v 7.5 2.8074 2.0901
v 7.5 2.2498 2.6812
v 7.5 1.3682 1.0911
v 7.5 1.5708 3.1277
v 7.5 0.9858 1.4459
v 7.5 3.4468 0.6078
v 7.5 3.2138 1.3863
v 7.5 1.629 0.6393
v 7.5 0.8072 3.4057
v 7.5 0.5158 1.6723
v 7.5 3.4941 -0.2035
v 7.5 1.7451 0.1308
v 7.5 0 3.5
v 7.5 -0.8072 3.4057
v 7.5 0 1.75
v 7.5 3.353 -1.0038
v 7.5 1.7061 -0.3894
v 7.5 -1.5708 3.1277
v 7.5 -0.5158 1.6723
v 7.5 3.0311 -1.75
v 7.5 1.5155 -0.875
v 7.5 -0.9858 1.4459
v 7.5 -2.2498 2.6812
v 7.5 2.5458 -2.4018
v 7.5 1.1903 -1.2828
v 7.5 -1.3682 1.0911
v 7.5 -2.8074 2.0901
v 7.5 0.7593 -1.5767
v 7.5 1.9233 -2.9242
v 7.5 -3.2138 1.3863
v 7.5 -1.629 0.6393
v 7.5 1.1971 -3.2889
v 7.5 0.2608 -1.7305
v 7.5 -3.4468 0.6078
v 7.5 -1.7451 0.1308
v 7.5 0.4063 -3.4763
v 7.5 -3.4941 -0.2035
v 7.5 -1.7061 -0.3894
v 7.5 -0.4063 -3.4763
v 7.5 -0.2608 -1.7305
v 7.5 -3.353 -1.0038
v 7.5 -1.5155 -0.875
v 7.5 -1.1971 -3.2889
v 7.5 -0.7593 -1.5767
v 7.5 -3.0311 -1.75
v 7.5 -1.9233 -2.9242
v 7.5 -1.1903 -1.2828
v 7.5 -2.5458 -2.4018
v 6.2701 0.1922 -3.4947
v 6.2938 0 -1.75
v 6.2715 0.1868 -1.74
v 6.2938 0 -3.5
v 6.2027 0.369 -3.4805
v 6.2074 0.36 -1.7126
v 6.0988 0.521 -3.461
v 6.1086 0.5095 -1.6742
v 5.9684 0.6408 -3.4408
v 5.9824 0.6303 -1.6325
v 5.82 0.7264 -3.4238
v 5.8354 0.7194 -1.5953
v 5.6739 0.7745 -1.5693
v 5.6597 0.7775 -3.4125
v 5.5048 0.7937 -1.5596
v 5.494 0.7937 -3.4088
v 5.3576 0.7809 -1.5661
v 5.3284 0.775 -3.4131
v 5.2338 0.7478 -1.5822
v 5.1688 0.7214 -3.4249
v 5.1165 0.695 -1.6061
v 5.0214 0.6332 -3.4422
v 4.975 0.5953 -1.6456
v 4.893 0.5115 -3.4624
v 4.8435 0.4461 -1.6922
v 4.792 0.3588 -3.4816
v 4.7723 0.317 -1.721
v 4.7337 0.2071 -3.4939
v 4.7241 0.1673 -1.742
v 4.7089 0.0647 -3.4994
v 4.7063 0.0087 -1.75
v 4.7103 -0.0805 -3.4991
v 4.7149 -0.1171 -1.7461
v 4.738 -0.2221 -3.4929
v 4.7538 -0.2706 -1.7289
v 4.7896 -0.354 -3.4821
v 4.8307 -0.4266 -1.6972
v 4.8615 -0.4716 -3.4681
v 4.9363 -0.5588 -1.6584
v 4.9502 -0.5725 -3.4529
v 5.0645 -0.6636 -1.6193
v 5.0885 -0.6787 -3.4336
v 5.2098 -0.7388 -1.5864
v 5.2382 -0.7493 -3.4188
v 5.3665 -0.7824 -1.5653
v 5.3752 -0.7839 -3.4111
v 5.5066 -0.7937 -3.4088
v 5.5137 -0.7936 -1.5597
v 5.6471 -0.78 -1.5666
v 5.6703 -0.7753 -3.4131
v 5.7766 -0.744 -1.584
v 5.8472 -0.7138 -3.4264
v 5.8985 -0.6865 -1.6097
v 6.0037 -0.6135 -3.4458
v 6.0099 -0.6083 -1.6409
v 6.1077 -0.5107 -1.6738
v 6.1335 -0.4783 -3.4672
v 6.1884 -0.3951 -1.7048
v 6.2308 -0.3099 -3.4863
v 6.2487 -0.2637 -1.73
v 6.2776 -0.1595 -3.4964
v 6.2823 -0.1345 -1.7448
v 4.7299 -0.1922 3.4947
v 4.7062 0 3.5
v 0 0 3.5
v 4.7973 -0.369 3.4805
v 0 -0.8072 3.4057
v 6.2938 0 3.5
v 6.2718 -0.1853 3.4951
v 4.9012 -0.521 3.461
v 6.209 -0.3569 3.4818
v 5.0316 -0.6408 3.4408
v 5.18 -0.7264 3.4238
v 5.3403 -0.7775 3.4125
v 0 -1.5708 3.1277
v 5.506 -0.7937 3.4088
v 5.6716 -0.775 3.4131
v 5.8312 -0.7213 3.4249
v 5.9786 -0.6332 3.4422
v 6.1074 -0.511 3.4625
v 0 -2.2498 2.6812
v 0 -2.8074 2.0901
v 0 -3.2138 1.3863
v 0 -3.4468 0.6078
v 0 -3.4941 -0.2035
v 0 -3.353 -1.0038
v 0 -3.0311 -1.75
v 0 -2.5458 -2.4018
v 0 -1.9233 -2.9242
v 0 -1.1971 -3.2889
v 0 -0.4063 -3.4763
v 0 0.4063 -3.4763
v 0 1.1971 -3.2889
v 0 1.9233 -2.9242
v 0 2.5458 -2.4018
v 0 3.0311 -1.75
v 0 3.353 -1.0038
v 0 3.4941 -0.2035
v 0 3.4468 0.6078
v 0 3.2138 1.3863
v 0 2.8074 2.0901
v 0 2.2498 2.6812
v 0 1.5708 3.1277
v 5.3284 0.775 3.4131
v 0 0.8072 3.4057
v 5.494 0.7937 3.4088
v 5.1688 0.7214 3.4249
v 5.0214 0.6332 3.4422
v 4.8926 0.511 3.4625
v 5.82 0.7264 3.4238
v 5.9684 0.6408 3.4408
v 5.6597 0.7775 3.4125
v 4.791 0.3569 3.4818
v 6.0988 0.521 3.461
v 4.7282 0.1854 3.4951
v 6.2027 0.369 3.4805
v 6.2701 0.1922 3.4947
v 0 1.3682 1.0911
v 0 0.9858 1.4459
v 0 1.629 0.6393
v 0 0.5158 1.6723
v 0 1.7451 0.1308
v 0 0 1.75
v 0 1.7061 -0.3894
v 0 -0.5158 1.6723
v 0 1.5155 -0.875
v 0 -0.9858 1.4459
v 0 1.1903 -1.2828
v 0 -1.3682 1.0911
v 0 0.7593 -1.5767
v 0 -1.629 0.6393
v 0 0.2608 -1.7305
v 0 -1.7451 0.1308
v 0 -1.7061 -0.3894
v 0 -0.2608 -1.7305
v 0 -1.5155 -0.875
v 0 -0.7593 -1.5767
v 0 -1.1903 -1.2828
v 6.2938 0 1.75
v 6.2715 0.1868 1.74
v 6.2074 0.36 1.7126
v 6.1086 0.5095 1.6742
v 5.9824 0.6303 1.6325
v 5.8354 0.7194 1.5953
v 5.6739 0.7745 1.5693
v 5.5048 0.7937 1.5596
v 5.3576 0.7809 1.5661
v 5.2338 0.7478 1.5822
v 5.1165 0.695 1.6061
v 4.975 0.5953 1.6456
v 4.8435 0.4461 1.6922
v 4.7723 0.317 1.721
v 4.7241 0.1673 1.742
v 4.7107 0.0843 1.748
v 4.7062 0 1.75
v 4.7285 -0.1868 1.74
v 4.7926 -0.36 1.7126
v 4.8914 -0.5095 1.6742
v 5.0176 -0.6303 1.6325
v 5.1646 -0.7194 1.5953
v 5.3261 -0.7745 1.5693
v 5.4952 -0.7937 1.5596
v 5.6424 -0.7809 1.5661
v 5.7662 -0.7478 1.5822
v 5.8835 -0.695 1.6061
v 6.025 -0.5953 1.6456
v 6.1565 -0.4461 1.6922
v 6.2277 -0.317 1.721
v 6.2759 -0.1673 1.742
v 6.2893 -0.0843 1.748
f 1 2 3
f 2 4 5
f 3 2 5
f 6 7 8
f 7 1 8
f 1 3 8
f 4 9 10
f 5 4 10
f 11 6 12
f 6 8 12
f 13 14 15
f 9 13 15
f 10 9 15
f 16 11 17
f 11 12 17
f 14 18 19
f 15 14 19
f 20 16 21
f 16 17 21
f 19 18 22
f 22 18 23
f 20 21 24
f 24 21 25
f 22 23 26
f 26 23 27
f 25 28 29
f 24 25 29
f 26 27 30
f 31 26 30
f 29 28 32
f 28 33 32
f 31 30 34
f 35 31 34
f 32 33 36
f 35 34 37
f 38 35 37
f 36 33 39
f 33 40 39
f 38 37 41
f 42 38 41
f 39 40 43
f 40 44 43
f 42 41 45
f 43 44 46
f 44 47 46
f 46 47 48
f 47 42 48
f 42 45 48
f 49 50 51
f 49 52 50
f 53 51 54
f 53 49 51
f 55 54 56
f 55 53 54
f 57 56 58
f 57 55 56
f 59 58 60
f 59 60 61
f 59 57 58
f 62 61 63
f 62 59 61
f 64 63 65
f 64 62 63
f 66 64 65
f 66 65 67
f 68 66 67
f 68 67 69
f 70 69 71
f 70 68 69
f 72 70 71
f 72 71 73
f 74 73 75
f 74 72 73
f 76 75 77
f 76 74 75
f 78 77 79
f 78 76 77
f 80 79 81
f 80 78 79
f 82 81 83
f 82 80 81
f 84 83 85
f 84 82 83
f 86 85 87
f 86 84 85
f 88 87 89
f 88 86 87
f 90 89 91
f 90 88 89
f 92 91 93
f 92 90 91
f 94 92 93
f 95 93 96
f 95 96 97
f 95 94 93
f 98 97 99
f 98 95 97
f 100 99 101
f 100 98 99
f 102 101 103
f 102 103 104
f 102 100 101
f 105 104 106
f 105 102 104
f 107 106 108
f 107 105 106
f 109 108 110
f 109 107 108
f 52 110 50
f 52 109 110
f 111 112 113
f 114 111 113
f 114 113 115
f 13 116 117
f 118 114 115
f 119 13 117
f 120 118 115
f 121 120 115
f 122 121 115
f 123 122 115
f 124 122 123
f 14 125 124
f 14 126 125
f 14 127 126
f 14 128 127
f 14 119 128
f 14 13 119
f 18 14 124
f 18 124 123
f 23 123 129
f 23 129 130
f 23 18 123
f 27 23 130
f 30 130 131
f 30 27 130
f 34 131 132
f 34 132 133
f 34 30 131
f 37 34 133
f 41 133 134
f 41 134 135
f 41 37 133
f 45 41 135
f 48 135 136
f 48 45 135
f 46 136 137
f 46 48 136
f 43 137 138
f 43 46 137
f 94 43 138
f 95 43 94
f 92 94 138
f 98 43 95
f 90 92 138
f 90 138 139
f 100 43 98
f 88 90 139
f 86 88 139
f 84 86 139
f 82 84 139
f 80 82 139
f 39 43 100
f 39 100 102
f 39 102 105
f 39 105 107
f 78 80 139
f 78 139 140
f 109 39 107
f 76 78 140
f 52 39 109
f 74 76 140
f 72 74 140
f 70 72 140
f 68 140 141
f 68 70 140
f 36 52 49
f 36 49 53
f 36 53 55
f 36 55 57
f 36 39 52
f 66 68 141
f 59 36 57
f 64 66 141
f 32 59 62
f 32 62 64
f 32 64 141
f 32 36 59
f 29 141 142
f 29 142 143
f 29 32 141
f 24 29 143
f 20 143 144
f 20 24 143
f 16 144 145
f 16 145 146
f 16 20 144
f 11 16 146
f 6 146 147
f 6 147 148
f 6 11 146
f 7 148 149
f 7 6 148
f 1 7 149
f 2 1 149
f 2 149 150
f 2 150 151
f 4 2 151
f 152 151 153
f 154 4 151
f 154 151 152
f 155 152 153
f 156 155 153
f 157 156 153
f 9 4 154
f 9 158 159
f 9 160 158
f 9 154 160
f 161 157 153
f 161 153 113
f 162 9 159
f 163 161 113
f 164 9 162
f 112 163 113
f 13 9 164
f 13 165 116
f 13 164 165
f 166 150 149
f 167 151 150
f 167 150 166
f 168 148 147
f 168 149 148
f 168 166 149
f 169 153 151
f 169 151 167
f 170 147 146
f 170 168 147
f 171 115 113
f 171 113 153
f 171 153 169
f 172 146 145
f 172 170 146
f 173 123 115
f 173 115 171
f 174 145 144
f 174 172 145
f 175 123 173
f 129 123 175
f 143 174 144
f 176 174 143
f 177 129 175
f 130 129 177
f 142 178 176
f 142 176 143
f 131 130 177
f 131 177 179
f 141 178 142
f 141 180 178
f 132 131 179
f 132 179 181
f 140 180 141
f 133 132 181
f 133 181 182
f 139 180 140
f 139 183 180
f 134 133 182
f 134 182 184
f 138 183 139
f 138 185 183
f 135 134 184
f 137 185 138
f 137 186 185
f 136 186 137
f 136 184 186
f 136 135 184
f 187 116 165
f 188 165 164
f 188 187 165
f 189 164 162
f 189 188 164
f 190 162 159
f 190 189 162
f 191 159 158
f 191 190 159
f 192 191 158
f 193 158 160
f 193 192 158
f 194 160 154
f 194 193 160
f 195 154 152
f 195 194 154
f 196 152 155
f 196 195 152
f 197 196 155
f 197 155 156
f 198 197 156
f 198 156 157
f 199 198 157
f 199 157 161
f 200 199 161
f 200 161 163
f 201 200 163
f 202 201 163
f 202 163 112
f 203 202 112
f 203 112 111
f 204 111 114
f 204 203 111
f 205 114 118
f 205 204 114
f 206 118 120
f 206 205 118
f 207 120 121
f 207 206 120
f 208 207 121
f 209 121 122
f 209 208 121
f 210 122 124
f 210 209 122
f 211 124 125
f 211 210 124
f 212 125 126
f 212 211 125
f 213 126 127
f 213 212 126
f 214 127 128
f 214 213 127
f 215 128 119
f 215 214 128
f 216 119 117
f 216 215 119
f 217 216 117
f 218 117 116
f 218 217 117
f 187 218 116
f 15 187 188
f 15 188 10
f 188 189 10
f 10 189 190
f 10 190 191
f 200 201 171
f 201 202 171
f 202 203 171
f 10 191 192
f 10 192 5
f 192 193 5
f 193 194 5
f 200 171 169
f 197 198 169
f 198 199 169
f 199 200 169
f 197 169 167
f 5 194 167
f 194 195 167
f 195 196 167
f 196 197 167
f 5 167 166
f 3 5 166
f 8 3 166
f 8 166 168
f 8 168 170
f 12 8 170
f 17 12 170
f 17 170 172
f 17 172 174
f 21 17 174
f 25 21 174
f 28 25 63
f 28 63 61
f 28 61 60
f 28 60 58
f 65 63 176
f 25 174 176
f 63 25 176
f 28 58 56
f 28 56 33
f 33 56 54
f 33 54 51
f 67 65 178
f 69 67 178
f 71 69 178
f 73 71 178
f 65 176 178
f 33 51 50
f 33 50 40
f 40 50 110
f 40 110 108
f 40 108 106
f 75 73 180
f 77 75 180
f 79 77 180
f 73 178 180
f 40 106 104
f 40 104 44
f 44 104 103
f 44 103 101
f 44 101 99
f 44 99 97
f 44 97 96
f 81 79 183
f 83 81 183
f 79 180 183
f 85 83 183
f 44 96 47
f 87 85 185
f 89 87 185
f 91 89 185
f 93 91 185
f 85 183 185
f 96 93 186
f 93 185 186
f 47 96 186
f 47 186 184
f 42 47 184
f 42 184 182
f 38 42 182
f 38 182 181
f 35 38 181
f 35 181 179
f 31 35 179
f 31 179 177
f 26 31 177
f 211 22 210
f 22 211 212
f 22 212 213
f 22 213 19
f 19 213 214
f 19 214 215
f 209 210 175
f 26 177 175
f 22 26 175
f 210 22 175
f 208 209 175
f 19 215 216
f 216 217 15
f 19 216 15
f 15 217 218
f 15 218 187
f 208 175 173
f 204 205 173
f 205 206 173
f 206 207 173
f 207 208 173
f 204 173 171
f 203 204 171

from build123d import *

# Parameters (mm, degrees)
SKETCH1_W               = 7.5
SKETCH1_H               = 3.5
SKETCH8_R               = 1.75
CUT_EXTRUDE6_DEPTH      = 10
CUT_EXTRUDE7_DEPTH      = 9.986100378
CUT_EXTRUDE7_DEPTH_BACK = 9.986100378
SKETCH9_R               = 0.79375


with BuildPart() as part:
    # Sketch1 → Revolve1 (revolve)
    with BuildSketch(Plane.XY, mode=Mode.PRIVATE) as revolve1_sk:
        with Locations((3.75, 1.75)):
            Rectangle(SKETCH1_W, SKETCH1_H)
    revolve(revolve1_sk.sketch.rotate(Axis((-11.701807229, 0, 0), (1, 0, 0)), 90), axis=Axis((-11.701807229, 0, 0), (1, 0, 0)))

    # Sketch8 → Cut-Extrude6 (cut)
    with BuildSketch(Plane.ZY):
        Circle(SKETCH8_R)
    extrude(amount=-CUT_EXTRUDE6_DEPTH, mode=Mode.SUBTRACT)

    # Sketch9 → Cut-Extrude7 (cut, two sides: drawn at the far end of the back side and taken through both)
    with BuildSketch(Plane.XY.offset(-CUT_EXTRUDE7_DEPTH_BACK)):
        with Locations((5.5, 0)):
            Circle(SKETCH9_R)
    extrude(amount=CUT_EXTRUDE7_DEPTH + CUT_EXTRUDE7_DEPTH_BACK, mode=Mode.SUBTRACT)


solid = part.part
